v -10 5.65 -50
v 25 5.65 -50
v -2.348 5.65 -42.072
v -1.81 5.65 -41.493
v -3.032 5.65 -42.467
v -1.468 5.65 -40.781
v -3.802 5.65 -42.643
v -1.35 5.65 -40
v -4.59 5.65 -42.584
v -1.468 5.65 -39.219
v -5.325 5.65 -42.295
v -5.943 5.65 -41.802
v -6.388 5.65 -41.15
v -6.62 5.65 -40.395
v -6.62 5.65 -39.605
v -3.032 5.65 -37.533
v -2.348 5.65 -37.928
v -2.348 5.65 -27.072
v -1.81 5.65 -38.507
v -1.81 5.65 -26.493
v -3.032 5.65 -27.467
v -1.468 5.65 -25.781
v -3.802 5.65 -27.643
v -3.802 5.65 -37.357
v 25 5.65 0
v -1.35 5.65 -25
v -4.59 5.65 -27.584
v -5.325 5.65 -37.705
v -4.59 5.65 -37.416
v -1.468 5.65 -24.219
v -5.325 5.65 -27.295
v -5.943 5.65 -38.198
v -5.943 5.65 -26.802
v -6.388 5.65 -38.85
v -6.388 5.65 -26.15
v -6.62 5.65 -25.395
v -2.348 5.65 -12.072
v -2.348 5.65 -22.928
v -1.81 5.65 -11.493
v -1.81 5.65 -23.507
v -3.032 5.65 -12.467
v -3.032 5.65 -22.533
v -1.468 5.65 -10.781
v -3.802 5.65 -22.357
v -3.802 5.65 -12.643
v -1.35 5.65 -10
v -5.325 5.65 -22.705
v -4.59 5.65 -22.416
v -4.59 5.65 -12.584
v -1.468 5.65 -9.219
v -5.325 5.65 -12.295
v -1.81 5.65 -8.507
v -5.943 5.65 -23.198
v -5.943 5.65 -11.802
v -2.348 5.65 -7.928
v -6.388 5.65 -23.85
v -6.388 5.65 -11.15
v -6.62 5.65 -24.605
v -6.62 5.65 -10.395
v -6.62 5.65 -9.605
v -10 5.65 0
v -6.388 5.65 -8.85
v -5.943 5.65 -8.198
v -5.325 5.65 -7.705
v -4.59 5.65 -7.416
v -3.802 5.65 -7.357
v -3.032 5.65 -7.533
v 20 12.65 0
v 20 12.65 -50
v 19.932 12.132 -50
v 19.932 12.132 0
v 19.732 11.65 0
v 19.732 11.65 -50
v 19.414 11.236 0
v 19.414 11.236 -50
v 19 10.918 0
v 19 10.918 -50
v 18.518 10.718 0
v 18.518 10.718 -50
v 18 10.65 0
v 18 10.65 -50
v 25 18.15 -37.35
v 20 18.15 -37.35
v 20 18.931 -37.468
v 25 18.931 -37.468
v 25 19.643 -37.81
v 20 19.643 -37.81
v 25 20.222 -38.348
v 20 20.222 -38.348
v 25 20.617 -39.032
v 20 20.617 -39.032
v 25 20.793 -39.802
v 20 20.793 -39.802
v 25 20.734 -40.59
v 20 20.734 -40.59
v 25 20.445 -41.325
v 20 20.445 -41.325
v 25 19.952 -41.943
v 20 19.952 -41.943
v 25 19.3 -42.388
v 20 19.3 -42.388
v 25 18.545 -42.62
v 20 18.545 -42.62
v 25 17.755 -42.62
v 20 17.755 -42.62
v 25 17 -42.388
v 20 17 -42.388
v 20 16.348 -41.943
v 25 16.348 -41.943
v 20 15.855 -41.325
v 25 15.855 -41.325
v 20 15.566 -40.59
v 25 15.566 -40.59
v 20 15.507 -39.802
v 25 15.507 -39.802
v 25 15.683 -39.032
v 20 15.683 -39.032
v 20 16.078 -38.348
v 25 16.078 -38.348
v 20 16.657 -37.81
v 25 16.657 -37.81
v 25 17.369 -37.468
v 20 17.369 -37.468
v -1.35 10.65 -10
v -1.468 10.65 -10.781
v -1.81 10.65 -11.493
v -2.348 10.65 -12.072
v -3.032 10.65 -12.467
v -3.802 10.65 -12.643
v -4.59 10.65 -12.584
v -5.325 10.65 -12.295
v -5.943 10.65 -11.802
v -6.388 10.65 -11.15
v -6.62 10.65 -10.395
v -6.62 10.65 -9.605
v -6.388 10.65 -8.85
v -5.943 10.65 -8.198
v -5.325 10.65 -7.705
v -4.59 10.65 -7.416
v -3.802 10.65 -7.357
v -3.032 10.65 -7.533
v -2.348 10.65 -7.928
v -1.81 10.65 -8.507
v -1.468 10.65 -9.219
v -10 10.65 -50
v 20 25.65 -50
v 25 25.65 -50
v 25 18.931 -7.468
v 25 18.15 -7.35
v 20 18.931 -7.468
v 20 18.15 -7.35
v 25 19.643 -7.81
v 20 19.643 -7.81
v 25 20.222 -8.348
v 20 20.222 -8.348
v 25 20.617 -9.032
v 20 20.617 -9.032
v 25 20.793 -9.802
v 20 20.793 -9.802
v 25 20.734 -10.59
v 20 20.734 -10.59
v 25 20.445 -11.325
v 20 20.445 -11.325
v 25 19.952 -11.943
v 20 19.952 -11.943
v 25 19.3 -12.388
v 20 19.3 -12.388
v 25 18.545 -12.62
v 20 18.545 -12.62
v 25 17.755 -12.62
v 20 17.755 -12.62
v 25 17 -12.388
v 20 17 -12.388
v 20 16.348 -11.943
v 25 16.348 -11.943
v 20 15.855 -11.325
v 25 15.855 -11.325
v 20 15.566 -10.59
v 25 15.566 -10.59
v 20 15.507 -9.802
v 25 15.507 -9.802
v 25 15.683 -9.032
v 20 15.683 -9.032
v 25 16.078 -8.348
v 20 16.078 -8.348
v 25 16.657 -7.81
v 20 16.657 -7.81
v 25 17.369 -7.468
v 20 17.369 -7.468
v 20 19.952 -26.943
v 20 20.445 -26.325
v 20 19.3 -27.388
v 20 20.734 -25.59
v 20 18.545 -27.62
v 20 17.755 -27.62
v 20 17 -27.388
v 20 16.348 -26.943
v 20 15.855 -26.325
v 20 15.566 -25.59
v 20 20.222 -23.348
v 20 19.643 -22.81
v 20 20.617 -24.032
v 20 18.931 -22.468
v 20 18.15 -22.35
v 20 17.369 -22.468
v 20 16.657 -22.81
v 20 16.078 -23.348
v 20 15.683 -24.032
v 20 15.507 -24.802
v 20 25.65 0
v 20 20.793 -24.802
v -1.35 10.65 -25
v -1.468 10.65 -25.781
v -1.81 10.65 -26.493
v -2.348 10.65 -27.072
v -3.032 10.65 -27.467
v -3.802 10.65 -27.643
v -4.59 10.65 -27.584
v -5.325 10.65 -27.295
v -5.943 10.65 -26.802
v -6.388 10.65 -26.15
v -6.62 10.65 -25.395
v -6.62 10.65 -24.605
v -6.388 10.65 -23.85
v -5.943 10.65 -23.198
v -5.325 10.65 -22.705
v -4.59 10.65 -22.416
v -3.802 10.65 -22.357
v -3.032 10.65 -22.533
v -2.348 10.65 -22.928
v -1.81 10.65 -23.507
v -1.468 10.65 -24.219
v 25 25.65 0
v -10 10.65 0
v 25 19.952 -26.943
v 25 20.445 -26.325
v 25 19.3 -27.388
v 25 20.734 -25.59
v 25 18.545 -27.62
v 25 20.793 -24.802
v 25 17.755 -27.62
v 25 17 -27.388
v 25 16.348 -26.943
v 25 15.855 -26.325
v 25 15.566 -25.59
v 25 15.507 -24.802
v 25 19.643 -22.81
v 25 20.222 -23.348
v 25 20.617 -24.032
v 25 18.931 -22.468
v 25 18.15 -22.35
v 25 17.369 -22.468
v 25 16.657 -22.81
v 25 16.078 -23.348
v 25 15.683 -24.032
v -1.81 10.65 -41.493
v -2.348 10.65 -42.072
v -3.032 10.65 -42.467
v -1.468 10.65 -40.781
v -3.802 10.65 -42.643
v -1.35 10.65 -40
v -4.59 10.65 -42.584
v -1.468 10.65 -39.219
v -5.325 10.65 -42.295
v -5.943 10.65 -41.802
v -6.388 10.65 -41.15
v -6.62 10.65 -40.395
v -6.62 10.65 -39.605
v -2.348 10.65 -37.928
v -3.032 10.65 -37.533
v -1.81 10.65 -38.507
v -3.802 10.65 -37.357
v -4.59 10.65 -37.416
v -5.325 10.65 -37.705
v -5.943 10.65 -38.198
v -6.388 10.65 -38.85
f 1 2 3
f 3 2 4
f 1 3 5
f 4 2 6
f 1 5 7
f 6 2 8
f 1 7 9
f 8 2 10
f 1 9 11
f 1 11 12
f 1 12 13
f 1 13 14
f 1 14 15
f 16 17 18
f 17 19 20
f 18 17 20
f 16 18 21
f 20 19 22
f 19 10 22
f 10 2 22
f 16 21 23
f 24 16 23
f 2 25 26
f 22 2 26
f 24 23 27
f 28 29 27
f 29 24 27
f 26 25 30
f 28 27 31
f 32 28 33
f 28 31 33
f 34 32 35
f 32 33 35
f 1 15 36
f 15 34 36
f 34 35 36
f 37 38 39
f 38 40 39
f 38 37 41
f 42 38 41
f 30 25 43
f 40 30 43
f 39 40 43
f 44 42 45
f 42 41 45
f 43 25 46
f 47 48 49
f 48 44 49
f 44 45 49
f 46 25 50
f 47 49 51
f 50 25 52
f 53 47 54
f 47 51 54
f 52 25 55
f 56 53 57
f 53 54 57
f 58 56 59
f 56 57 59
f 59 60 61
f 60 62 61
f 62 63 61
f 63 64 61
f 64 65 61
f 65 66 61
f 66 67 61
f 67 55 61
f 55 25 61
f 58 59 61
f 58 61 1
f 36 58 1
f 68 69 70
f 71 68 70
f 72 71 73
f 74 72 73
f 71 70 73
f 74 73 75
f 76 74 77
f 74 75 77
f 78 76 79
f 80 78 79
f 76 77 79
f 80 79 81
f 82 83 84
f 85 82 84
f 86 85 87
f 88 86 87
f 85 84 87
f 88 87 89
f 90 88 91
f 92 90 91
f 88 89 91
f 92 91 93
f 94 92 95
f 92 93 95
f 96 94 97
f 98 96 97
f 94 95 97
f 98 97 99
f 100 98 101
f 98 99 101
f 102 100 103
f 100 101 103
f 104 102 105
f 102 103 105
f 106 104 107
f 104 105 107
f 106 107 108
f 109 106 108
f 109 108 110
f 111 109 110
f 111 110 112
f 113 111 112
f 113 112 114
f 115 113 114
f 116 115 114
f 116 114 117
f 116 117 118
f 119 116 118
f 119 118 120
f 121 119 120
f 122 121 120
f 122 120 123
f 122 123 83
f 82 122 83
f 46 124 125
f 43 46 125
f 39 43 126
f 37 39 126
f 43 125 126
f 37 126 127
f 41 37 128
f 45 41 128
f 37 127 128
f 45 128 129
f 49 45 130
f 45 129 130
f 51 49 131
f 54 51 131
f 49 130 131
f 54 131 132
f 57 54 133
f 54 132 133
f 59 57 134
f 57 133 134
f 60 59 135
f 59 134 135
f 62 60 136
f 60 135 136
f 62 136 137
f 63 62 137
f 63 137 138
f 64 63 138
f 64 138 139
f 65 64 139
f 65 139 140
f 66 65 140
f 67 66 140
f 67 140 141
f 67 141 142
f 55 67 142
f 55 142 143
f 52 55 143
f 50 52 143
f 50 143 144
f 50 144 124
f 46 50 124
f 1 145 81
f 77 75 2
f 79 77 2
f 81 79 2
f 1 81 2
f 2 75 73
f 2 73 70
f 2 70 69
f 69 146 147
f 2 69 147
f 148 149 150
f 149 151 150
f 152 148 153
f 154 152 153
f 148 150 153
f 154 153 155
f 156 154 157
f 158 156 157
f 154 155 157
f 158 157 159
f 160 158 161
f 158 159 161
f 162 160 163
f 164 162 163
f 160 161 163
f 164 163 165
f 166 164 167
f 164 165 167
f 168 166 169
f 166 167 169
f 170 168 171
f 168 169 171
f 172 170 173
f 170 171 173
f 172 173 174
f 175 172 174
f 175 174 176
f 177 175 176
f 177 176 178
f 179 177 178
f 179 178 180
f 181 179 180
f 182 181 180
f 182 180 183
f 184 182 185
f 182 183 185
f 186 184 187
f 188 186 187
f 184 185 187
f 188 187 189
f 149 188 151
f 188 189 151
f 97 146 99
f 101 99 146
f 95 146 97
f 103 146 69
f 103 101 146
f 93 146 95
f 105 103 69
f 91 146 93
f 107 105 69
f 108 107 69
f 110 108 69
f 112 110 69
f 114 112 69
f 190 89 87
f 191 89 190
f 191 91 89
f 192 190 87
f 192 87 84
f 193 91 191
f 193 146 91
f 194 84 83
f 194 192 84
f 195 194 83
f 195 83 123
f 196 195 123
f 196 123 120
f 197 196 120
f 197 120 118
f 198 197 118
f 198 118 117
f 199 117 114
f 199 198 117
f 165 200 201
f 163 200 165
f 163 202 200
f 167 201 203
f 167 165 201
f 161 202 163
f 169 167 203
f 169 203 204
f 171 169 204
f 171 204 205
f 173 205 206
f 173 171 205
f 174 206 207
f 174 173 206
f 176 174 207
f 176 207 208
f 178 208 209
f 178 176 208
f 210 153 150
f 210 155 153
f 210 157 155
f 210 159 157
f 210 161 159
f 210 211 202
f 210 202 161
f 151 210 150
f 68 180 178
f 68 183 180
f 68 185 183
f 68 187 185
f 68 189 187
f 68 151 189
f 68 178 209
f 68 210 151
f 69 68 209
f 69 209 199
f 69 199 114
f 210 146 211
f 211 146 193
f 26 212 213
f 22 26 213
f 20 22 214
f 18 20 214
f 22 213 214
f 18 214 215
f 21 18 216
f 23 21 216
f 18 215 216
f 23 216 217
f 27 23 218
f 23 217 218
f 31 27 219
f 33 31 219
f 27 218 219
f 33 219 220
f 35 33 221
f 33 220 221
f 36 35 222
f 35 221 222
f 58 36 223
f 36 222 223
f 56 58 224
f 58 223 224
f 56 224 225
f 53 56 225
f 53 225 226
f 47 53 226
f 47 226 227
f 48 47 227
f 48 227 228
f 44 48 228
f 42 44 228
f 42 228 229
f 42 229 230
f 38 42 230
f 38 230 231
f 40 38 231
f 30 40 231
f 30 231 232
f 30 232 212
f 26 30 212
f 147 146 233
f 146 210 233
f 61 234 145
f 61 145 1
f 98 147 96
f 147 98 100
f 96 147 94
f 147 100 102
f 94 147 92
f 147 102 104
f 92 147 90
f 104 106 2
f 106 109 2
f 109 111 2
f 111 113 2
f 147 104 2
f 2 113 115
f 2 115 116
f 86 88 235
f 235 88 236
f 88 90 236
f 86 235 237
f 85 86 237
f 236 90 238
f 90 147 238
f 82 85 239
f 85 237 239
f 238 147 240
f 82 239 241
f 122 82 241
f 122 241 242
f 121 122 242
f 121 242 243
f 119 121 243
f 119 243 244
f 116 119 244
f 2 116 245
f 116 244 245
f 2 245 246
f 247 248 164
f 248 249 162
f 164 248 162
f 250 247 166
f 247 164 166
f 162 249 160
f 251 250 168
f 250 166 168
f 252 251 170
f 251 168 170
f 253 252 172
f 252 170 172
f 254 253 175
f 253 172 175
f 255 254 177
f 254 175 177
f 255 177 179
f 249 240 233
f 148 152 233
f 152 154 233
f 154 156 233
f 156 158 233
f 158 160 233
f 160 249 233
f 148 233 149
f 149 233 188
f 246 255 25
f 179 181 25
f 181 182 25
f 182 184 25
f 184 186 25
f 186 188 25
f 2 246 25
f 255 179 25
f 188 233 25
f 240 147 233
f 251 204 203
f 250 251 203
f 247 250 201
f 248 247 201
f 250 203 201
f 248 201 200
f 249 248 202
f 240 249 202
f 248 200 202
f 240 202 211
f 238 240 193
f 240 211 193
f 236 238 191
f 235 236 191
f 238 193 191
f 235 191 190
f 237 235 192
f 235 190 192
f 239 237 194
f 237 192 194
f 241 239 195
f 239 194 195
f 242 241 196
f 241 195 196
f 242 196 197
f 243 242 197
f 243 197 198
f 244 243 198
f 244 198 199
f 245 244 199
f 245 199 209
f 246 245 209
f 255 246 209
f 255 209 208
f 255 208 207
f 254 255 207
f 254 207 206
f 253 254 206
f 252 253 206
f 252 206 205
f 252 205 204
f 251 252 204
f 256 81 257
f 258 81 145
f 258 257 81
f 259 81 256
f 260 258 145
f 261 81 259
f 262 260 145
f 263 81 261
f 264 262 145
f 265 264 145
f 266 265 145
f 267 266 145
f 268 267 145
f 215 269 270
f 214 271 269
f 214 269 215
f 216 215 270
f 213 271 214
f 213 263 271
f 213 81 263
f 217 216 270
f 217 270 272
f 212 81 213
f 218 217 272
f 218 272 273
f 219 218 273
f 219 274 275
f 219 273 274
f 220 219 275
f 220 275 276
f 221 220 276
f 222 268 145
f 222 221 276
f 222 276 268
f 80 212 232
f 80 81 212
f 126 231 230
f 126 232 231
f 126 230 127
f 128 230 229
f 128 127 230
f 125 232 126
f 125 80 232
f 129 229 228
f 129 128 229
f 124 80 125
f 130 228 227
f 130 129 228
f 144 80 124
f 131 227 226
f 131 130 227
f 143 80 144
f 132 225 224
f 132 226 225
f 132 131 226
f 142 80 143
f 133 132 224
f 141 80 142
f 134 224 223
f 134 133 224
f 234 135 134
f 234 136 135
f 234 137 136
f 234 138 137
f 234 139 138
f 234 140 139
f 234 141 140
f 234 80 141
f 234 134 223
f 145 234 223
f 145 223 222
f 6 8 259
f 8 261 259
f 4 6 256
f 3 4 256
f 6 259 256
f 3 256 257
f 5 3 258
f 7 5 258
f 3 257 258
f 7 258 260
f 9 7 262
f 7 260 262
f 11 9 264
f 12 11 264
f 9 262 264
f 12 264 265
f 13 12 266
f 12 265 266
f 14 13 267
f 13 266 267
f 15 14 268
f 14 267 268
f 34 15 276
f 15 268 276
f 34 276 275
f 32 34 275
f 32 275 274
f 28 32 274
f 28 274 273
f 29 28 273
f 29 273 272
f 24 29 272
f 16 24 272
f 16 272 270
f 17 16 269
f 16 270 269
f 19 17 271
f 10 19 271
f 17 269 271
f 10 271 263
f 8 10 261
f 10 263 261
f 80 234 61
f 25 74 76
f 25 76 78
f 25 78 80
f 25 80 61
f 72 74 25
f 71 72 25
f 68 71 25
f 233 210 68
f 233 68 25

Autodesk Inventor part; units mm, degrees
ref_plane "YZ Plane" through (0, 0, 0) normal (1, 0, 0) x (0, 1, 0)
ref_plane "XZ Plane" through (0, 0, 0) normal (0, 1, 0) x (-1, 0, 0)
ref_plane "XY Plane" through (0, 0, 0) normal (0, 0, 1) x (1, 0, 0)
sketch "Sketch1" plane through (0, 0, 0) normal (0, 0, 1) x (1, 0, 0)
  line L0 (25, 5.55) -> (-25, 5.55) construction
  line L1 (-25, 5.55) -> (-25, -5.55) construction
  line L2 (-25, -5.55) -> (25, -5.55) construction
  line L3 (25, -5.55) -> (25, 5.55) construction
  line L4 (25.1, -5.55) -> (25.1, 149.35) construction
  line L5 (25.1, -5.55) -> (35.1, -5.55) construction
  line L6 (35.1, -5.55) -> (35.1, 149.35) construction
  line L7 (25.1, 149.35) -> (35.1, 149.35) construction
  line L8 (25, 25.65) -> (25, 5.65)
  line L9 (25, 5.65) -> (-10, 5.65)
  line L10 (20, 25.65) -> (20, 10.65)
  line L11 (20, 10.65) -> (-10, 10.65)
  line L12 (20, 25.65) -> (25, 25.65)
  line L13 (-10, 10.65) -> (-10, 5.65)
  point P0 (0, 0)
  dimension "d0" = 0.1
  dimension "d1" = 0.1
  dimension "d2" = 5
  dimension "d3" = 35
  dimension "d4" = 20
extrude "Extrusion1" add sketch "Sketch1" against normal blind 50
sketch "Sketch2" plane through (20, 10.65, 0) normal (-1, 0, 0) x (0, 0, 1)
  circle A0 centre (-40, 7.5) radius 2.65
  line L0 (-50, 0) -> (-50, 15) projected
  line L1 (-50, 7.5) -> (-0.7445, 7.5) construction
  line L2 (0, 15) -> (-50, 15) projected
  line L3 (-25, 15) -> (-25, 0) construction
  line L4 (0, 0) -> (-50, 0) projected
  circle A1 centre (-10, 7.5) radius 2.65
  circle A2 centre (-25, 7.5) radius 2.65
  point P0 (0, -10.65)
  dimension "d7" = 5.3
  dimension "d8" = 10
  dimension "d9" = 5.3
extrude "Extrusion2" cut sketch "Sketch2" against normal through all
sketch "Sketch3" plane through (-10, 10.65, 0) normal (0, 1, 0) x (1, 0, 0)
  circle A0 centre (6, 10) radius 2.65
  line L0 (30, 0) -> (0, 0) projected
  line L1 (0, 0) -> (0, 50) projected
  line L2 (6, 0) -> (6, 49.4853) construction
  line L3 (0, 0) -> (0, 50) projected
  line L4 (0, 25) -> (30, 25) construction
  line L5 (30, 22.35) -> (30, 27.65) projected
  circle A1 centre (6, 40) radius 2.65
  circle A2 centre (6, 25) radius 2.65
  point P0 (10, 0)
  dimension "d12" = 5.3
  dimension "d13" = 10
  dimension "d14" = 6
  dimension "d15" = 5.3
extrude "Extrusion3" cut sketch "Sketch3" against normal through all
fillet "Fillet1" radius 2 1 edges at (20, 10.65, -25)
equation "\"d9\" = d7"
equation "\"d15\" = d12"
properties part number "Linear Rail Frame Bracket"
